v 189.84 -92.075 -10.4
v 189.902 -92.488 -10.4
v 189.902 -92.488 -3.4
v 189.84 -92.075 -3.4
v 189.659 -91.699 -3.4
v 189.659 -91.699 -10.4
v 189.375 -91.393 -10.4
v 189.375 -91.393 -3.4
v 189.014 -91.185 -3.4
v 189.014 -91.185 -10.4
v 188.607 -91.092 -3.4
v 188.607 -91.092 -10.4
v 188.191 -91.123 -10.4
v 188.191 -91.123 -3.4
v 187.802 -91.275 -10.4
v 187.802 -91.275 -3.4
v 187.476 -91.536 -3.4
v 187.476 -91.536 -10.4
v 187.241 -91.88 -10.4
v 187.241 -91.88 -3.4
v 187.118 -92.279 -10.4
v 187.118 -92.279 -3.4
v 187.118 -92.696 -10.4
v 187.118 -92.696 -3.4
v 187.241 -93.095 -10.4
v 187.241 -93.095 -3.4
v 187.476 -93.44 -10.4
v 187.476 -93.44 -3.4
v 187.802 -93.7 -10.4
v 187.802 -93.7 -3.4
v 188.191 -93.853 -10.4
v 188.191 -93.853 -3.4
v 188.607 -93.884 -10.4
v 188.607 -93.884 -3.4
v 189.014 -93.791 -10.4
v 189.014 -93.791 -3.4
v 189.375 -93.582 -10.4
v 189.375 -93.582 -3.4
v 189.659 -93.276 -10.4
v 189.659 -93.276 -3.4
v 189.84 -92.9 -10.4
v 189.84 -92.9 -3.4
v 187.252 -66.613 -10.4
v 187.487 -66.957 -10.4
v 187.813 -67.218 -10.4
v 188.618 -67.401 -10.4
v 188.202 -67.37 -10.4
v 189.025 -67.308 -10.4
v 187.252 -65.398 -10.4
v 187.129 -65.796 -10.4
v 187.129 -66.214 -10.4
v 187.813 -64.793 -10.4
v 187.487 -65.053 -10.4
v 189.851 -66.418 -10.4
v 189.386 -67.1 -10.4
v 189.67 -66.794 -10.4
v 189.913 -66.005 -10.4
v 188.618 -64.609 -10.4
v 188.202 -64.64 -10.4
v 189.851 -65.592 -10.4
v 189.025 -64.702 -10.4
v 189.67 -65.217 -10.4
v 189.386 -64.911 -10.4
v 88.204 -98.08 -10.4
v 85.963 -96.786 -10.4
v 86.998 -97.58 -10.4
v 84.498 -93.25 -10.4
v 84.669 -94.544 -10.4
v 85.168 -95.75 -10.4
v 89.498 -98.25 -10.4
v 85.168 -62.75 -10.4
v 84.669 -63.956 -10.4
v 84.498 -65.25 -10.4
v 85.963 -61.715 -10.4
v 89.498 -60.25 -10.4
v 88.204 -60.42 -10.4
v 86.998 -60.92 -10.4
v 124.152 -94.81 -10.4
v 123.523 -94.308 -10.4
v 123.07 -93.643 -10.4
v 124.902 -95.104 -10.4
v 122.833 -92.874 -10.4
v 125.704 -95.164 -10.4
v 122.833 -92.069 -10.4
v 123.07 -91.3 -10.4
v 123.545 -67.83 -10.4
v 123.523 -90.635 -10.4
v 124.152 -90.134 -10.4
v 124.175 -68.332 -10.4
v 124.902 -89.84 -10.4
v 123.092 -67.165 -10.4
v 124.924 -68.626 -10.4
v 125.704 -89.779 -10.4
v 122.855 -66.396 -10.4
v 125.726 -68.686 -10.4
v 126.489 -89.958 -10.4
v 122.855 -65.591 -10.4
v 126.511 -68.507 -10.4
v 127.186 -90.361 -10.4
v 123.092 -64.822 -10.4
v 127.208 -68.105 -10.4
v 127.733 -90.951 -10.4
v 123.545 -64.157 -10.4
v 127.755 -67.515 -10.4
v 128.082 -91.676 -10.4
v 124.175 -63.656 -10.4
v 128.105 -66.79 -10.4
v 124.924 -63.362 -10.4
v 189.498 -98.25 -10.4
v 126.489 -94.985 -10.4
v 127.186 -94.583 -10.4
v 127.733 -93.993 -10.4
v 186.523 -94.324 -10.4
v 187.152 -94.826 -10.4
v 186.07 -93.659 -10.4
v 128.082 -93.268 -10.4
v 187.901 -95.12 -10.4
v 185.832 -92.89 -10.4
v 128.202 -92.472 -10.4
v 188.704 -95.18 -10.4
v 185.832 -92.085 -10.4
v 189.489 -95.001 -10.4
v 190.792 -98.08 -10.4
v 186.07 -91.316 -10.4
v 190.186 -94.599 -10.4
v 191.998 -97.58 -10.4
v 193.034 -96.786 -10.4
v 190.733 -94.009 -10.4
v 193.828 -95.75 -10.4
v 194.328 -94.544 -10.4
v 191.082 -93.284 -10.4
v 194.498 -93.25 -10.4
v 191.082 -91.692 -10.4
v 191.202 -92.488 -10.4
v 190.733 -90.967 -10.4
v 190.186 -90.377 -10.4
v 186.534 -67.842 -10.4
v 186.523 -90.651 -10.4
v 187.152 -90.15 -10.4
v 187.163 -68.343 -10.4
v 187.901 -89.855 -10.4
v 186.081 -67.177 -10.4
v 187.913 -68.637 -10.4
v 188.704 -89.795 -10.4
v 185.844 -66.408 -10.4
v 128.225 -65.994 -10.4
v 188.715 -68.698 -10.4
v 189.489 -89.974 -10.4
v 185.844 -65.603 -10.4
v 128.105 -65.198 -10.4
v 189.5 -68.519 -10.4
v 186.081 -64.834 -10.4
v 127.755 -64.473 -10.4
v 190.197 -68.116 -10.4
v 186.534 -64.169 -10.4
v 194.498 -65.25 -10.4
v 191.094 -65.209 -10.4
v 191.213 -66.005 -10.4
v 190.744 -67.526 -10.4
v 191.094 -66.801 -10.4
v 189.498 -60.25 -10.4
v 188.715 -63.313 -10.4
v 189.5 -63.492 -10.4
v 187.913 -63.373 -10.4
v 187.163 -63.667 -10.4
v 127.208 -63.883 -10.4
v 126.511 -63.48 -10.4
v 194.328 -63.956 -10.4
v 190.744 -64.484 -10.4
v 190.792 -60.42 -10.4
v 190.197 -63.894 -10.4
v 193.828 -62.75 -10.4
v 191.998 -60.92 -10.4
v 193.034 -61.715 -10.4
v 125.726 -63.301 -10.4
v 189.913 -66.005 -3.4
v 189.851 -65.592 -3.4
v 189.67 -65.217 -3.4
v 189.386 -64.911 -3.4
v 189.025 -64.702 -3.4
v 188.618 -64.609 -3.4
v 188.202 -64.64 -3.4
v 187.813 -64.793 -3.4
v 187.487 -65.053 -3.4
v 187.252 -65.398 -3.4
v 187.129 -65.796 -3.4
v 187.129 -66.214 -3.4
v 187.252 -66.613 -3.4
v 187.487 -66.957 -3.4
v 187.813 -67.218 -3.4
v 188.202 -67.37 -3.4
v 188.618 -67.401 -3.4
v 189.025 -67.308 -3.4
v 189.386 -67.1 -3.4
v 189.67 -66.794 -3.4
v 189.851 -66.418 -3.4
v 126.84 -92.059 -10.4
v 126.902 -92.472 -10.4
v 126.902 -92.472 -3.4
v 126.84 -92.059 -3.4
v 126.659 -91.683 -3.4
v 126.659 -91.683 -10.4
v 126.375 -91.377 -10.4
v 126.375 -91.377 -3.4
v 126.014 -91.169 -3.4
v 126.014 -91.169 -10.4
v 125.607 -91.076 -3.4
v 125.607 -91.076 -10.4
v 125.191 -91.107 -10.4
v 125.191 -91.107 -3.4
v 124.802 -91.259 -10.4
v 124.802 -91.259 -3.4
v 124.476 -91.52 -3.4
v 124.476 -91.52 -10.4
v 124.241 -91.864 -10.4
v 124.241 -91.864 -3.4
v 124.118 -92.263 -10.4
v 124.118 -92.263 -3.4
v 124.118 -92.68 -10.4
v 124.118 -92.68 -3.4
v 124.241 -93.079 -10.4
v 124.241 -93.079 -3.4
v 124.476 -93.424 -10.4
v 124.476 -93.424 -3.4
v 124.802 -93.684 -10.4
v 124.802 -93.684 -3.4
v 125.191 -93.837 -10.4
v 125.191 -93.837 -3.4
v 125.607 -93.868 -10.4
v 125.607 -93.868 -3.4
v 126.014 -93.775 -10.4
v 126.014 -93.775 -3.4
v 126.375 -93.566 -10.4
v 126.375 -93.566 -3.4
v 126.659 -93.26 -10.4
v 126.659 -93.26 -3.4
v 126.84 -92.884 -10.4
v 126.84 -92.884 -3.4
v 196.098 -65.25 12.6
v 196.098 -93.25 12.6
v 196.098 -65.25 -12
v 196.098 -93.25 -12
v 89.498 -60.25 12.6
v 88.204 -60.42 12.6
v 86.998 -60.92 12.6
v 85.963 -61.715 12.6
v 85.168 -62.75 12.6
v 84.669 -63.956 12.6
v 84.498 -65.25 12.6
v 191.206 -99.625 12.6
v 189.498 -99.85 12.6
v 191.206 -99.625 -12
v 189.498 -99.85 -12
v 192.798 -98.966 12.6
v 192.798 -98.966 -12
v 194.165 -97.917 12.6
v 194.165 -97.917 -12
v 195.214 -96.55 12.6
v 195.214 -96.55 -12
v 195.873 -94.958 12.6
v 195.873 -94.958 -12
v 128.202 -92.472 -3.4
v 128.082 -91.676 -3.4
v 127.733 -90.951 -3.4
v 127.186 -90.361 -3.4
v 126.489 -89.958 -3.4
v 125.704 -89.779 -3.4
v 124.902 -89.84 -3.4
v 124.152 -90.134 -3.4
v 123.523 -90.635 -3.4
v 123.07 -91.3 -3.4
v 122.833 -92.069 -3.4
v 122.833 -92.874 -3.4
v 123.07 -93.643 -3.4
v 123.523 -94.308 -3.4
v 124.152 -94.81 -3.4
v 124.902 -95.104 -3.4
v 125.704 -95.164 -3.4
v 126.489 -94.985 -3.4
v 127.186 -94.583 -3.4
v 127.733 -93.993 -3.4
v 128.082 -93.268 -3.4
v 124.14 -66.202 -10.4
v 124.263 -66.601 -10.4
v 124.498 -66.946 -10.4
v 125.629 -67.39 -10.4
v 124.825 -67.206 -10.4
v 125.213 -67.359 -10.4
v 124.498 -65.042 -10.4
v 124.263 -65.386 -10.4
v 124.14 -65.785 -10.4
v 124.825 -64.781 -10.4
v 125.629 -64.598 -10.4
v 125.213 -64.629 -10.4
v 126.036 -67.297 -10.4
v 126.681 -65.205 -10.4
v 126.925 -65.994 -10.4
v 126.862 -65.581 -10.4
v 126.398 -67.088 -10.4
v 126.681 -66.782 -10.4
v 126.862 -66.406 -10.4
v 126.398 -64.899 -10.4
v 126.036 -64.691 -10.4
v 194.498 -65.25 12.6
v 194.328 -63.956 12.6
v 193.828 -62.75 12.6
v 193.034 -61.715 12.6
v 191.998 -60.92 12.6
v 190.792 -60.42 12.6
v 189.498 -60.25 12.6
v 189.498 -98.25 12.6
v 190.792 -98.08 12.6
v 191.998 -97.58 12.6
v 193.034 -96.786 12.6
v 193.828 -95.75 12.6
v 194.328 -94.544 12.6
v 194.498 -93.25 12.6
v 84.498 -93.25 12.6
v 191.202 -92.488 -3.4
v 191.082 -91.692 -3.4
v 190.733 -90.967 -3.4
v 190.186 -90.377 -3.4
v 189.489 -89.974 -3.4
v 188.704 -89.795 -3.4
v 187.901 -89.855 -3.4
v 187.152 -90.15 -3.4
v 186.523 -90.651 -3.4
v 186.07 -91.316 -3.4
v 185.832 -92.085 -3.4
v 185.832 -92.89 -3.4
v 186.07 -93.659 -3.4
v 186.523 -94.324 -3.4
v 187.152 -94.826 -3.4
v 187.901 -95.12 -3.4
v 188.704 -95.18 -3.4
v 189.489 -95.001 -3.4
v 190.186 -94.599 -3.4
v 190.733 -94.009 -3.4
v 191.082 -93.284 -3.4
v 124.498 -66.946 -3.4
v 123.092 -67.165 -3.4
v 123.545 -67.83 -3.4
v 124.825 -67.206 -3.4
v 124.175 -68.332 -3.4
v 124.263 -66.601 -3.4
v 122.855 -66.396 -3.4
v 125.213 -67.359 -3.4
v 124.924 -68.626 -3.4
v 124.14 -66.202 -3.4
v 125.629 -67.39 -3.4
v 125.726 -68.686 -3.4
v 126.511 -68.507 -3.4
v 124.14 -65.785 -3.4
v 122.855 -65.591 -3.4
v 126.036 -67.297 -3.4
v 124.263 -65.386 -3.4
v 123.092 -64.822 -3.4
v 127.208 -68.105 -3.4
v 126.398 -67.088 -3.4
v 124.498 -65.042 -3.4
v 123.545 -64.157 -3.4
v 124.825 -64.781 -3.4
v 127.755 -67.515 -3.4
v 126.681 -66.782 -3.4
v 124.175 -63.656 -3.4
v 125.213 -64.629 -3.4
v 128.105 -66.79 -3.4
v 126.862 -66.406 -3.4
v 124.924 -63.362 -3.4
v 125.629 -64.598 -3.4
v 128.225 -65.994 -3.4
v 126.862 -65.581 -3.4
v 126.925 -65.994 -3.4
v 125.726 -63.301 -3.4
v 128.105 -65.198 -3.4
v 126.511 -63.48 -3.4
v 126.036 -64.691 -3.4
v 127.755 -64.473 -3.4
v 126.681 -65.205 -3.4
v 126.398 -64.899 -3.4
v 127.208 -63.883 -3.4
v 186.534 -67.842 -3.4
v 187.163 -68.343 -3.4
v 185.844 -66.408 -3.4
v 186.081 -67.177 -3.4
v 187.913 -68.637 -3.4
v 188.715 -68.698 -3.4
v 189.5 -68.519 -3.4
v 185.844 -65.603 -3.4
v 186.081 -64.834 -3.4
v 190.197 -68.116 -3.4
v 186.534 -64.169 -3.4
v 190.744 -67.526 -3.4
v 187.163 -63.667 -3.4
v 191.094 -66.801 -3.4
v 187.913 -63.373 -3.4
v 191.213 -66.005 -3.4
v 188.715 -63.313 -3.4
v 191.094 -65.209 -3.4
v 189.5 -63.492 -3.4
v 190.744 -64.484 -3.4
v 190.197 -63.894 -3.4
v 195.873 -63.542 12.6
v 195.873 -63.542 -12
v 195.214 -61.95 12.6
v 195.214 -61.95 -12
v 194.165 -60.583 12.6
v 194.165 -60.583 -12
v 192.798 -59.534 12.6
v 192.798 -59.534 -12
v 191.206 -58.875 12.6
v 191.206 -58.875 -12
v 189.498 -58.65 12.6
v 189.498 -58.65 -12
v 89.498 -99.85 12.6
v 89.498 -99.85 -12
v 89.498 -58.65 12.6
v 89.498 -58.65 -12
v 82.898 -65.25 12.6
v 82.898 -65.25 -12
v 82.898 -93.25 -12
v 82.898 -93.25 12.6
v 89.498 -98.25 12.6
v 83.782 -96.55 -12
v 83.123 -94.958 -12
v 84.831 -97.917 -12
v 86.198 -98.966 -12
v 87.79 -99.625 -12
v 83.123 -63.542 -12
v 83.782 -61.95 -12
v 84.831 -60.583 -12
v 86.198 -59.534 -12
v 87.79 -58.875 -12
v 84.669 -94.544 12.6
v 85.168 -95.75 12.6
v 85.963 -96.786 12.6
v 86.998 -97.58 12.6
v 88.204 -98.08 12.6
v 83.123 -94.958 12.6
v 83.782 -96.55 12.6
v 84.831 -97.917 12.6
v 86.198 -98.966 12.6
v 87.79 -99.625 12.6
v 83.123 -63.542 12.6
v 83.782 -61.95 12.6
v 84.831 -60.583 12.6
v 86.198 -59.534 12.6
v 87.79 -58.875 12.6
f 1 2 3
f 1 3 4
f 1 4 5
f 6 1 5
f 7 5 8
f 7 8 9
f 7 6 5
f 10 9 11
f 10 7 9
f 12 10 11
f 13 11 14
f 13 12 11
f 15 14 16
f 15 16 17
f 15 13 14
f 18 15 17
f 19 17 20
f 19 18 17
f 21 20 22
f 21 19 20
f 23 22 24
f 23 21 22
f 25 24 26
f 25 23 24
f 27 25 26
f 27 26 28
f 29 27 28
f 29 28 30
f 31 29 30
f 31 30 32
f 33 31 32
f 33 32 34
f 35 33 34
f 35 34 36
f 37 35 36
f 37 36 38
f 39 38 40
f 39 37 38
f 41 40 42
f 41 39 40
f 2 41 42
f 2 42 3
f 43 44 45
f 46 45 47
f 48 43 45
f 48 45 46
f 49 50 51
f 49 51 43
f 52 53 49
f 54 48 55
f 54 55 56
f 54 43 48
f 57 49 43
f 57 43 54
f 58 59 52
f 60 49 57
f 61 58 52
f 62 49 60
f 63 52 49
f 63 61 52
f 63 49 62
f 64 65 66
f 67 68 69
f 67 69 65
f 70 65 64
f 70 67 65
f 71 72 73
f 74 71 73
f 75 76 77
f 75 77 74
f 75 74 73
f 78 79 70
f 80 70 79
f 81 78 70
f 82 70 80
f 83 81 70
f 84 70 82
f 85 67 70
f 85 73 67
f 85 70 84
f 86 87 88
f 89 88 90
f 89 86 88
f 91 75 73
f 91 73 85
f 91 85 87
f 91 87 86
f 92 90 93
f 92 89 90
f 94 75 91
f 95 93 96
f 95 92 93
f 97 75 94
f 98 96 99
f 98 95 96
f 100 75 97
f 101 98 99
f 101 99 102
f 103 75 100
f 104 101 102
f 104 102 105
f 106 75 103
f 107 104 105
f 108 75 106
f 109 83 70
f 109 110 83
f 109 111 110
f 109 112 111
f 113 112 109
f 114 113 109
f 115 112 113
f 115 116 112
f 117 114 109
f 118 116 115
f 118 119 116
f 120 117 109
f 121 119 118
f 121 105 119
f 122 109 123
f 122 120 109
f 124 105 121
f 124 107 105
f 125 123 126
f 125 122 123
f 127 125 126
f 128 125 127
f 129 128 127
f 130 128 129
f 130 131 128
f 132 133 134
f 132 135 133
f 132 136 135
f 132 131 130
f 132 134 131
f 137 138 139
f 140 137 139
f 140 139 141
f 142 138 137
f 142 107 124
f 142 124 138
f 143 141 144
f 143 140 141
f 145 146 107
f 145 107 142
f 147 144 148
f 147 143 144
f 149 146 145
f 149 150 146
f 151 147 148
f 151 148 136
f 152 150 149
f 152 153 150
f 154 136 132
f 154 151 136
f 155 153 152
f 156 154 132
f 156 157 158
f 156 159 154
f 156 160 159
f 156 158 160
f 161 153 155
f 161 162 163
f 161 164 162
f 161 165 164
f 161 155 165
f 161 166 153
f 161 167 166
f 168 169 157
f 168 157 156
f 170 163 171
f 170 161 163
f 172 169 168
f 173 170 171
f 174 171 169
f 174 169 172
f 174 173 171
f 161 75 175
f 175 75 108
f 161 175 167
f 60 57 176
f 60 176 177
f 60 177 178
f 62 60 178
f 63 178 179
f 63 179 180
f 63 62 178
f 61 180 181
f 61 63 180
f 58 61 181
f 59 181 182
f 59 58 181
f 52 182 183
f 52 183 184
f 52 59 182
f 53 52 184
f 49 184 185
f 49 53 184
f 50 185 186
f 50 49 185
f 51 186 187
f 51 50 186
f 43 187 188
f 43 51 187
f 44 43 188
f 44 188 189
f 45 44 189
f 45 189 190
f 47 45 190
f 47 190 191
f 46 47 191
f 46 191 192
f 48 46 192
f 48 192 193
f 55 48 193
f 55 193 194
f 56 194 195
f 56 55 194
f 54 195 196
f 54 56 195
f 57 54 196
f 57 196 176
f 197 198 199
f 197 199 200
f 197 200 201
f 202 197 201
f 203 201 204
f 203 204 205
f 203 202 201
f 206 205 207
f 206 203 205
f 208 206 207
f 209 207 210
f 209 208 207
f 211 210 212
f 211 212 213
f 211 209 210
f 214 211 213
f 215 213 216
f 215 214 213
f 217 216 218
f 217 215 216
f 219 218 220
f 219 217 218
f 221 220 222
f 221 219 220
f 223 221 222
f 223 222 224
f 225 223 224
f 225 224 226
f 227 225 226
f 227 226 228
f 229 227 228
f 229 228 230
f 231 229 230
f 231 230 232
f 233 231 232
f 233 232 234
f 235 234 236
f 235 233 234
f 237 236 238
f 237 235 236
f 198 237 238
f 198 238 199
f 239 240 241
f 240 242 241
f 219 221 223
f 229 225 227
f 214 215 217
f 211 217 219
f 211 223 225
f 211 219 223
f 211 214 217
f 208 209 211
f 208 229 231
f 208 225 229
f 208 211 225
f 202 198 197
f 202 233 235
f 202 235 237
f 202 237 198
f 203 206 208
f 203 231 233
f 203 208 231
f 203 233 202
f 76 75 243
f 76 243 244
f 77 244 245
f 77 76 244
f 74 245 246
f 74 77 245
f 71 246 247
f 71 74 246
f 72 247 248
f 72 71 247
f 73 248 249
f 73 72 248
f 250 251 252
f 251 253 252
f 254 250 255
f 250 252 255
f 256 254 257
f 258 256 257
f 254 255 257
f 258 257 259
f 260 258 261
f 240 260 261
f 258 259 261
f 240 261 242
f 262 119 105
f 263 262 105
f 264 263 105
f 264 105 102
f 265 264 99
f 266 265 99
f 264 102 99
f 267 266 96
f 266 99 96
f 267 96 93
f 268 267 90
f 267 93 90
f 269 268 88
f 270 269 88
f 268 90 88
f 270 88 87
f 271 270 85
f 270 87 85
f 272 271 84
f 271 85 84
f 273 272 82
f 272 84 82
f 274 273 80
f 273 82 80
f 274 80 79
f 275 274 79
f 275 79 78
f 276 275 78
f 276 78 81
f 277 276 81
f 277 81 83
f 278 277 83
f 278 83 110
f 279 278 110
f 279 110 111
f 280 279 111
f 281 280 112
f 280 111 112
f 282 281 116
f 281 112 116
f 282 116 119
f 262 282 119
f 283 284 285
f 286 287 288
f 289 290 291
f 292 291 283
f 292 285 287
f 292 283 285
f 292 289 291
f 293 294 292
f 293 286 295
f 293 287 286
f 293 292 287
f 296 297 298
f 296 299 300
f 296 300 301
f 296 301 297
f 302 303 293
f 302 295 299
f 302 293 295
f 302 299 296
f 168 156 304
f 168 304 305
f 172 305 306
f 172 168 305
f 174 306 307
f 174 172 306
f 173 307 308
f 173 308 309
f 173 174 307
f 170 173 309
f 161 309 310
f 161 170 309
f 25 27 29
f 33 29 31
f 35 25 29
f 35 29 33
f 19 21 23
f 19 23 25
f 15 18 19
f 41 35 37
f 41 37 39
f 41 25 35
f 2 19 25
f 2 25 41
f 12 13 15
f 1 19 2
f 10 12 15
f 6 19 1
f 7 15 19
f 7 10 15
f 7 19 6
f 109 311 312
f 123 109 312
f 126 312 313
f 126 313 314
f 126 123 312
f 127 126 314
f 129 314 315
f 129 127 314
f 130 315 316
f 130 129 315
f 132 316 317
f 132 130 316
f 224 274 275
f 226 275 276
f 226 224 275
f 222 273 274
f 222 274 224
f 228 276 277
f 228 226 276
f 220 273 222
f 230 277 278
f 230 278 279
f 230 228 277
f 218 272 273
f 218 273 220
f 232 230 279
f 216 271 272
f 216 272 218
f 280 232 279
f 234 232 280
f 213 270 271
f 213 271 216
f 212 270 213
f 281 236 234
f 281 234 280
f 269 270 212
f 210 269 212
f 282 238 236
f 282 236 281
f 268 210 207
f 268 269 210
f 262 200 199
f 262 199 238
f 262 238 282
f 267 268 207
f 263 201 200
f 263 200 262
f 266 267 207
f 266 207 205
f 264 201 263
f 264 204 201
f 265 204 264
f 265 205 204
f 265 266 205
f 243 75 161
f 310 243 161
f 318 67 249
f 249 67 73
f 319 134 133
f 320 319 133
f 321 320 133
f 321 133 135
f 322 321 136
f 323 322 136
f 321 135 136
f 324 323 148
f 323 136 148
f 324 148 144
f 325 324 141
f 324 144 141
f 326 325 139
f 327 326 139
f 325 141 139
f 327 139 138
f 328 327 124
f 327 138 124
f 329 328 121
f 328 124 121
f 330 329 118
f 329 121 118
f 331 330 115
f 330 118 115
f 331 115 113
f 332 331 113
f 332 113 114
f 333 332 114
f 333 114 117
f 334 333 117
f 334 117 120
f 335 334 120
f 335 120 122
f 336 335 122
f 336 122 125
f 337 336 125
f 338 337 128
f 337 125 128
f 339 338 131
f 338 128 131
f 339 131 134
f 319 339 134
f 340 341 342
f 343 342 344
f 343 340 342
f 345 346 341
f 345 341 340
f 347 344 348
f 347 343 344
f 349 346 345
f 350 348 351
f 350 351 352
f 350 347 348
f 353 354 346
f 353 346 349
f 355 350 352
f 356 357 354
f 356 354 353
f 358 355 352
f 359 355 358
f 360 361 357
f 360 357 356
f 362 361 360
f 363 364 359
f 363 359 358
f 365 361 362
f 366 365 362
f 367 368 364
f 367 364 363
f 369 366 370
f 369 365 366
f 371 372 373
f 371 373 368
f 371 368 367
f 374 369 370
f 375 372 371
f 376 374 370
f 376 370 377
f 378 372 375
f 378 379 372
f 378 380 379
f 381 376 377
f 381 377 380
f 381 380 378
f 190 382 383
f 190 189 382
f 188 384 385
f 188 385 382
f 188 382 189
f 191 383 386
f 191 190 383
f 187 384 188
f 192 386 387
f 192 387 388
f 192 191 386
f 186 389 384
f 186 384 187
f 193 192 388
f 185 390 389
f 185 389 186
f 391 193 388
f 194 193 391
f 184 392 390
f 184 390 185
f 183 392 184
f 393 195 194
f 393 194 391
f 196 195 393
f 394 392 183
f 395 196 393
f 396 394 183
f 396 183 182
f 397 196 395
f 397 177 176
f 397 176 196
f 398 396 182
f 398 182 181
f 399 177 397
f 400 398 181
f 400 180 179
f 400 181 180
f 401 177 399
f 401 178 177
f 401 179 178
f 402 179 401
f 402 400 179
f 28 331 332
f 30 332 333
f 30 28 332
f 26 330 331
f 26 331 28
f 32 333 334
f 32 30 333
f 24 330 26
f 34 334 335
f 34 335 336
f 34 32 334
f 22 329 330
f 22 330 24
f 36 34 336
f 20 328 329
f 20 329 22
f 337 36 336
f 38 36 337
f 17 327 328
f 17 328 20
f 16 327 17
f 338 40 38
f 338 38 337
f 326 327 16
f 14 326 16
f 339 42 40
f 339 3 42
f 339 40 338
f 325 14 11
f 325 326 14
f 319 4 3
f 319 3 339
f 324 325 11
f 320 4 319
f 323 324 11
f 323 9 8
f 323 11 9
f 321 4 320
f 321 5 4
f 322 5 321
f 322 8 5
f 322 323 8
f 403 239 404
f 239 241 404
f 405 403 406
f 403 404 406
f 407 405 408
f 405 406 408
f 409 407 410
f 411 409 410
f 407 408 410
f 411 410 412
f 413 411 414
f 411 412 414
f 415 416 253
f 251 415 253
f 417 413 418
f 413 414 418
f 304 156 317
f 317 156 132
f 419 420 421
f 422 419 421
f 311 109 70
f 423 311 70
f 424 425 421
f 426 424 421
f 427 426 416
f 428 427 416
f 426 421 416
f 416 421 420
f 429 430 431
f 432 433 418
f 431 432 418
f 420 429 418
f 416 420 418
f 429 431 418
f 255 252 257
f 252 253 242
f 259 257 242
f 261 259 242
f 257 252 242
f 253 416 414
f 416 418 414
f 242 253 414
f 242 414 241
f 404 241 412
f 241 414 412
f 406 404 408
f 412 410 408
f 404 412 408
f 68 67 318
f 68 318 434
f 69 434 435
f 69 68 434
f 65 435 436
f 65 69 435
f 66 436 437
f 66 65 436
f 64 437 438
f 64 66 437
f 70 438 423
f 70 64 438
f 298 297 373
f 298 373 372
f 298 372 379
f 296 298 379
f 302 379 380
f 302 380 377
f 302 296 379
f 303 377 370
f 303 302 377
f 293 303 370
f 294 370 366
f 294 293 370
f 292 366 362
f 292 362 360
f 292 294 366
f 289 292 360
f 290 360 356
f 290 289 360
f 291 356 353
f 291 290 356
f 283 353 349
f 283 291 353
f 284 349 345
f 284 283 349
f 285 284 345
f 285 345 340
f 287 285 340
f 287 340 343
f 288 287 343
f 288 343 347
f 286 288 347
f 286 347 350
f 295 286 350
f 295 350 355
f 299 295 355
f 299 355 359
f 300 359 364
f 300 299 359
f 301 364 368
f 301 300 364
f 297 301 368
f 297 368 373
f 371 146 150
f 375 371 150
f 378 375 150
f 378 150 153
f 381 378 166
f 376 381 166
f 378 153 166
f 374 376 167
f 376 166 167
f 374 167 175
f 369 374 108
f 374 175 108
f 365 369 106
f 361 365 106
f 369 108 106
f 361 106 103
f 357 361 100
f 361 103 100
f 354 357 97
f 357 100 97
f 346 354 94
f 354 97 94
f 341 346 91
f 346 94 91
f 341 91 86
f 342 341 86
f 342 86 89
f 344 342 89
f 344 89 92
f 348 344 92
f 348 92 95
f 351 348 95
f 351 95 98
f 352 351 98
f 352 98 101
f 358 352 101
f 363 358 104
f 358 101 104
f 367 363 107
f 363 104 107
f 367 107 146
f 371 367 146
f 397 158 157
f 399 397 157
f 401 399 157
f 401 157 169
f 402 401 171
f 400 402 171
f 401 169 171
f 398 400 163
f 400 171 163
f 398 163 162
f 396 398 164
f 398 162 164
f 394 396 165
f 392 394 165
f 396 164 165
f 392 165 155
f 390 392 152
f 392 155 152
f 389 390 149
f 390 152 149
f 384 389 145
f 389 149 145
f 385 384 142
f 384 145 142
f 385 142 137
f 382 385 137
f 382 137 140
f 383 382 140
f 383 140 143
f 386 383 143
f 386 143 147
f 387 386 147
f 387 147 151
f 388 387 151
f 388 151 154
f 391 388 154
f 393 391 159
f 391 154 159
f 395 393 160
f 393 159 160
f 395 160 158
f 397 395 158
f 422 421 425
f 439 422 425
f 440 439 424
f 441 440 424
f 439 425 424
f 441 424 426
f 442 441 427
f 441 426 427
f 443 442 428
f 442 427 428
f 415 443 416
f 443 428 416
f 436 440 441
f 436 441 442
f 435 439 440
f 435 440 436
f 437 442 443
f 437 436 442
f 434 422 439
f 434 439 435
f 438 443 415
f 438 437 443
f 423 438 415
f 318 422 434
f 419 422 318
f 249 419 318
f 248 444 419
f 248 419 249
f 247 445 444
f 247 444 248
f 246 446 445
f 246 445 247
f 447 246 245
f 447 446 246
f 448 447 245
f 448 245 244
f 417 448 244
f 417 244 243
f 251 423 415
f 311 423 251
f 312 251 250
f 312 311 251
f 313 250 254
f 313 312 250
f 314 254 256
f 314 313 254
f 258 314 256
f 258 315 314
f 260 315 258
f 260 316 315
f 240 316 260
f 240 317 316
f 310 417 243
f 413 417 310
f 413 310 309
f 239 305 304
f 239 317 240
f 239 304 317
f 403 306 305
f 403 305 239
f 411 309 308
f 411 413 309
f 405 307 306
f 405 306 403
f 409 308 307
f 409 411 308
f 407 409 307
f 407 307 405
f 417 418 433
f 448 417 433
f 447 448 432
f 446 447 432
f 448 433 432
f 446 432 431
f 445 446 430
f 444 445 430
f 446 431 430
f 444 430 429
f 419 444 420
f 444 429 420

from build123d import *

# Parameters (mm, degrees)
SKETCH002_R      = 2.7
SKETCH002_R_2    = 1.4
EXTRUDE001_DEPTH = 7
EXTRUDE002_DEPTH = 23
EXTRUDE_DEPTH    = 1.6


with BuildPart() as pootjesm3:
    # Sketch002 (on Face10 of Extrude) → Extrude001 (new body)
    with BuildSketch(Plane.XY.offset(-10.4)):
        with Locations((90.524621, -65.993824)):
            Circle(SKETCH002_R)
        with Locations((90.524621, -65.993824)):
            Circle(SKETCH002_R_2, mode=Mode.SUBTRACT)
        with Locations((90.502441, -92.471822)):
            Circle(SKETCH002_R)
        with Locations((90.502441, -92.471822)):
            Circle(SKETCH002_R_2, mode=Mode.SUBTRACT)
        with Locations((153.513474, -66.00515)):
            Circle(SKETCH002_R)
        with Locations((153.513474, -66.00515)):
            Circle(SKETCH002_R_2, mode=Mode.SUBTRACT)
        with Locations((153.502167, -92.48777)):
            Circle(SKETCH002_R)
        with Locations((153.502167, -92.48777)):
            Circle(SKETCH002_R_2, mode=Mode.SUBTRACT)
    extrude(amount=EXTRUDE001_DEPTH)


with BuildPart() as pootjesm3_1:
    # Extrude001 placement: moved
    add(pootjesm3.part.moved(Location((35, 0, 0))))


with BuildPart() as walls:
    # Sketch → Extrude002 (new body)
    with BuildSketch(Plane.XY):
        with BuildLine():
            Line((89.498192, -99.850084), (189.498192, -99.850084))
            ThreePointArc((189.498192, -99.850084), (194.165097, -97.916989), (196.098192, -93.250084))
            Line((196.098192, -93.250084), (196.098192, -65.250084))
            ThreePointArc((196.098192, -65.250084), (194.165097, -60.583179), (189.498192, -58.650084))
            Line((189.498192, -58.650084), (89.498192, -58.650084))
            ThreePointArc((89.498192, -58.650084), (84.831287, -60.583179), (82.898192, -65.250084))
            Line((82.898192, -65.250084), (82.898192, -93.250084))
            ThreePointArc((82.898192, -93.250084), (84.831287, -97.916989), (89.498192, -99.850084))
        make_face()
        with BuildLine():
            Line((89.498192, -60.250084), (189.498192, -60.250084))
            ThreePointArc((194.498192, -65.250084), (193.033726, -61.71455), (189.498192, -60.250084))
            Line((194.498192, -65.250084), (194.498192, -93.250084))
            ThreePointArc((189.498192, -98.250084), (193.033726, -96.785618), (194.498192, -93.250084))
            Line((189.498192, -98.250084), (89.498192, -98.250084))
            ThreePointArc((84.498192, -93.250084), (85.962658, -96.785618), (89.498192, -98.250084))
            Line((84.498192, -93.250084), (84.498192, -65.250084))
            ThreePointArc((89.498192, -60.250084), (85.962658, -61.71455), (84.498192, -65.250084))
        make_face(mode=Mode.SUBTRACT)
    extrude(amount=EXTRUDE002_DEPTH)


with BuildPart() as walls_1:
    # Extrude002 placement: moved
    add(walls.part.moved(Location((0, 0, -10.4))))


with BuildPart() as doos:
    # Sketch001 → Extrude (new body)
    with BuildSketch(Plane.XY):
        with BuildLine():
            Line((89.498192, -99.850084), (189.498192, -99.850084))
            ThreePointArc((189.498192, -99.850084), (194.165097, -97.916989), (196.098192, -93.250084))
            Line((196.098192, -93.250084), (196.098192, -65.250084))
            ThreePointArc((196.098192, -65.250084), (194.165097, -60.583179), (189.498192, -58.650084))
            Line((189.498192, -58.650084), (89.498192, -58.650084))
            ThreePointArc((89.498192, -58.650084), (84.831287, -60.583179), (82.898192, -65.250084))
            Line((82.898192, -65.250084), (82.898192, -93.250084))
            ThreePointArc((82.898192, -93.250084), (84.831287, -97.916989), (89.498192, -99.850084))
        make_face()
    extrude(amount=EXTRUDE_DEPTH)


with BuildPart() as doos_1:
    # Extrude placement: moved
    add(doos.part.moved(Location((0, 0, -12))))

    # Fusion: union pootjesM3, Walls
    add(pootjesm3_1.part)
    add(walls_1.part)


solid = doos_1.part
